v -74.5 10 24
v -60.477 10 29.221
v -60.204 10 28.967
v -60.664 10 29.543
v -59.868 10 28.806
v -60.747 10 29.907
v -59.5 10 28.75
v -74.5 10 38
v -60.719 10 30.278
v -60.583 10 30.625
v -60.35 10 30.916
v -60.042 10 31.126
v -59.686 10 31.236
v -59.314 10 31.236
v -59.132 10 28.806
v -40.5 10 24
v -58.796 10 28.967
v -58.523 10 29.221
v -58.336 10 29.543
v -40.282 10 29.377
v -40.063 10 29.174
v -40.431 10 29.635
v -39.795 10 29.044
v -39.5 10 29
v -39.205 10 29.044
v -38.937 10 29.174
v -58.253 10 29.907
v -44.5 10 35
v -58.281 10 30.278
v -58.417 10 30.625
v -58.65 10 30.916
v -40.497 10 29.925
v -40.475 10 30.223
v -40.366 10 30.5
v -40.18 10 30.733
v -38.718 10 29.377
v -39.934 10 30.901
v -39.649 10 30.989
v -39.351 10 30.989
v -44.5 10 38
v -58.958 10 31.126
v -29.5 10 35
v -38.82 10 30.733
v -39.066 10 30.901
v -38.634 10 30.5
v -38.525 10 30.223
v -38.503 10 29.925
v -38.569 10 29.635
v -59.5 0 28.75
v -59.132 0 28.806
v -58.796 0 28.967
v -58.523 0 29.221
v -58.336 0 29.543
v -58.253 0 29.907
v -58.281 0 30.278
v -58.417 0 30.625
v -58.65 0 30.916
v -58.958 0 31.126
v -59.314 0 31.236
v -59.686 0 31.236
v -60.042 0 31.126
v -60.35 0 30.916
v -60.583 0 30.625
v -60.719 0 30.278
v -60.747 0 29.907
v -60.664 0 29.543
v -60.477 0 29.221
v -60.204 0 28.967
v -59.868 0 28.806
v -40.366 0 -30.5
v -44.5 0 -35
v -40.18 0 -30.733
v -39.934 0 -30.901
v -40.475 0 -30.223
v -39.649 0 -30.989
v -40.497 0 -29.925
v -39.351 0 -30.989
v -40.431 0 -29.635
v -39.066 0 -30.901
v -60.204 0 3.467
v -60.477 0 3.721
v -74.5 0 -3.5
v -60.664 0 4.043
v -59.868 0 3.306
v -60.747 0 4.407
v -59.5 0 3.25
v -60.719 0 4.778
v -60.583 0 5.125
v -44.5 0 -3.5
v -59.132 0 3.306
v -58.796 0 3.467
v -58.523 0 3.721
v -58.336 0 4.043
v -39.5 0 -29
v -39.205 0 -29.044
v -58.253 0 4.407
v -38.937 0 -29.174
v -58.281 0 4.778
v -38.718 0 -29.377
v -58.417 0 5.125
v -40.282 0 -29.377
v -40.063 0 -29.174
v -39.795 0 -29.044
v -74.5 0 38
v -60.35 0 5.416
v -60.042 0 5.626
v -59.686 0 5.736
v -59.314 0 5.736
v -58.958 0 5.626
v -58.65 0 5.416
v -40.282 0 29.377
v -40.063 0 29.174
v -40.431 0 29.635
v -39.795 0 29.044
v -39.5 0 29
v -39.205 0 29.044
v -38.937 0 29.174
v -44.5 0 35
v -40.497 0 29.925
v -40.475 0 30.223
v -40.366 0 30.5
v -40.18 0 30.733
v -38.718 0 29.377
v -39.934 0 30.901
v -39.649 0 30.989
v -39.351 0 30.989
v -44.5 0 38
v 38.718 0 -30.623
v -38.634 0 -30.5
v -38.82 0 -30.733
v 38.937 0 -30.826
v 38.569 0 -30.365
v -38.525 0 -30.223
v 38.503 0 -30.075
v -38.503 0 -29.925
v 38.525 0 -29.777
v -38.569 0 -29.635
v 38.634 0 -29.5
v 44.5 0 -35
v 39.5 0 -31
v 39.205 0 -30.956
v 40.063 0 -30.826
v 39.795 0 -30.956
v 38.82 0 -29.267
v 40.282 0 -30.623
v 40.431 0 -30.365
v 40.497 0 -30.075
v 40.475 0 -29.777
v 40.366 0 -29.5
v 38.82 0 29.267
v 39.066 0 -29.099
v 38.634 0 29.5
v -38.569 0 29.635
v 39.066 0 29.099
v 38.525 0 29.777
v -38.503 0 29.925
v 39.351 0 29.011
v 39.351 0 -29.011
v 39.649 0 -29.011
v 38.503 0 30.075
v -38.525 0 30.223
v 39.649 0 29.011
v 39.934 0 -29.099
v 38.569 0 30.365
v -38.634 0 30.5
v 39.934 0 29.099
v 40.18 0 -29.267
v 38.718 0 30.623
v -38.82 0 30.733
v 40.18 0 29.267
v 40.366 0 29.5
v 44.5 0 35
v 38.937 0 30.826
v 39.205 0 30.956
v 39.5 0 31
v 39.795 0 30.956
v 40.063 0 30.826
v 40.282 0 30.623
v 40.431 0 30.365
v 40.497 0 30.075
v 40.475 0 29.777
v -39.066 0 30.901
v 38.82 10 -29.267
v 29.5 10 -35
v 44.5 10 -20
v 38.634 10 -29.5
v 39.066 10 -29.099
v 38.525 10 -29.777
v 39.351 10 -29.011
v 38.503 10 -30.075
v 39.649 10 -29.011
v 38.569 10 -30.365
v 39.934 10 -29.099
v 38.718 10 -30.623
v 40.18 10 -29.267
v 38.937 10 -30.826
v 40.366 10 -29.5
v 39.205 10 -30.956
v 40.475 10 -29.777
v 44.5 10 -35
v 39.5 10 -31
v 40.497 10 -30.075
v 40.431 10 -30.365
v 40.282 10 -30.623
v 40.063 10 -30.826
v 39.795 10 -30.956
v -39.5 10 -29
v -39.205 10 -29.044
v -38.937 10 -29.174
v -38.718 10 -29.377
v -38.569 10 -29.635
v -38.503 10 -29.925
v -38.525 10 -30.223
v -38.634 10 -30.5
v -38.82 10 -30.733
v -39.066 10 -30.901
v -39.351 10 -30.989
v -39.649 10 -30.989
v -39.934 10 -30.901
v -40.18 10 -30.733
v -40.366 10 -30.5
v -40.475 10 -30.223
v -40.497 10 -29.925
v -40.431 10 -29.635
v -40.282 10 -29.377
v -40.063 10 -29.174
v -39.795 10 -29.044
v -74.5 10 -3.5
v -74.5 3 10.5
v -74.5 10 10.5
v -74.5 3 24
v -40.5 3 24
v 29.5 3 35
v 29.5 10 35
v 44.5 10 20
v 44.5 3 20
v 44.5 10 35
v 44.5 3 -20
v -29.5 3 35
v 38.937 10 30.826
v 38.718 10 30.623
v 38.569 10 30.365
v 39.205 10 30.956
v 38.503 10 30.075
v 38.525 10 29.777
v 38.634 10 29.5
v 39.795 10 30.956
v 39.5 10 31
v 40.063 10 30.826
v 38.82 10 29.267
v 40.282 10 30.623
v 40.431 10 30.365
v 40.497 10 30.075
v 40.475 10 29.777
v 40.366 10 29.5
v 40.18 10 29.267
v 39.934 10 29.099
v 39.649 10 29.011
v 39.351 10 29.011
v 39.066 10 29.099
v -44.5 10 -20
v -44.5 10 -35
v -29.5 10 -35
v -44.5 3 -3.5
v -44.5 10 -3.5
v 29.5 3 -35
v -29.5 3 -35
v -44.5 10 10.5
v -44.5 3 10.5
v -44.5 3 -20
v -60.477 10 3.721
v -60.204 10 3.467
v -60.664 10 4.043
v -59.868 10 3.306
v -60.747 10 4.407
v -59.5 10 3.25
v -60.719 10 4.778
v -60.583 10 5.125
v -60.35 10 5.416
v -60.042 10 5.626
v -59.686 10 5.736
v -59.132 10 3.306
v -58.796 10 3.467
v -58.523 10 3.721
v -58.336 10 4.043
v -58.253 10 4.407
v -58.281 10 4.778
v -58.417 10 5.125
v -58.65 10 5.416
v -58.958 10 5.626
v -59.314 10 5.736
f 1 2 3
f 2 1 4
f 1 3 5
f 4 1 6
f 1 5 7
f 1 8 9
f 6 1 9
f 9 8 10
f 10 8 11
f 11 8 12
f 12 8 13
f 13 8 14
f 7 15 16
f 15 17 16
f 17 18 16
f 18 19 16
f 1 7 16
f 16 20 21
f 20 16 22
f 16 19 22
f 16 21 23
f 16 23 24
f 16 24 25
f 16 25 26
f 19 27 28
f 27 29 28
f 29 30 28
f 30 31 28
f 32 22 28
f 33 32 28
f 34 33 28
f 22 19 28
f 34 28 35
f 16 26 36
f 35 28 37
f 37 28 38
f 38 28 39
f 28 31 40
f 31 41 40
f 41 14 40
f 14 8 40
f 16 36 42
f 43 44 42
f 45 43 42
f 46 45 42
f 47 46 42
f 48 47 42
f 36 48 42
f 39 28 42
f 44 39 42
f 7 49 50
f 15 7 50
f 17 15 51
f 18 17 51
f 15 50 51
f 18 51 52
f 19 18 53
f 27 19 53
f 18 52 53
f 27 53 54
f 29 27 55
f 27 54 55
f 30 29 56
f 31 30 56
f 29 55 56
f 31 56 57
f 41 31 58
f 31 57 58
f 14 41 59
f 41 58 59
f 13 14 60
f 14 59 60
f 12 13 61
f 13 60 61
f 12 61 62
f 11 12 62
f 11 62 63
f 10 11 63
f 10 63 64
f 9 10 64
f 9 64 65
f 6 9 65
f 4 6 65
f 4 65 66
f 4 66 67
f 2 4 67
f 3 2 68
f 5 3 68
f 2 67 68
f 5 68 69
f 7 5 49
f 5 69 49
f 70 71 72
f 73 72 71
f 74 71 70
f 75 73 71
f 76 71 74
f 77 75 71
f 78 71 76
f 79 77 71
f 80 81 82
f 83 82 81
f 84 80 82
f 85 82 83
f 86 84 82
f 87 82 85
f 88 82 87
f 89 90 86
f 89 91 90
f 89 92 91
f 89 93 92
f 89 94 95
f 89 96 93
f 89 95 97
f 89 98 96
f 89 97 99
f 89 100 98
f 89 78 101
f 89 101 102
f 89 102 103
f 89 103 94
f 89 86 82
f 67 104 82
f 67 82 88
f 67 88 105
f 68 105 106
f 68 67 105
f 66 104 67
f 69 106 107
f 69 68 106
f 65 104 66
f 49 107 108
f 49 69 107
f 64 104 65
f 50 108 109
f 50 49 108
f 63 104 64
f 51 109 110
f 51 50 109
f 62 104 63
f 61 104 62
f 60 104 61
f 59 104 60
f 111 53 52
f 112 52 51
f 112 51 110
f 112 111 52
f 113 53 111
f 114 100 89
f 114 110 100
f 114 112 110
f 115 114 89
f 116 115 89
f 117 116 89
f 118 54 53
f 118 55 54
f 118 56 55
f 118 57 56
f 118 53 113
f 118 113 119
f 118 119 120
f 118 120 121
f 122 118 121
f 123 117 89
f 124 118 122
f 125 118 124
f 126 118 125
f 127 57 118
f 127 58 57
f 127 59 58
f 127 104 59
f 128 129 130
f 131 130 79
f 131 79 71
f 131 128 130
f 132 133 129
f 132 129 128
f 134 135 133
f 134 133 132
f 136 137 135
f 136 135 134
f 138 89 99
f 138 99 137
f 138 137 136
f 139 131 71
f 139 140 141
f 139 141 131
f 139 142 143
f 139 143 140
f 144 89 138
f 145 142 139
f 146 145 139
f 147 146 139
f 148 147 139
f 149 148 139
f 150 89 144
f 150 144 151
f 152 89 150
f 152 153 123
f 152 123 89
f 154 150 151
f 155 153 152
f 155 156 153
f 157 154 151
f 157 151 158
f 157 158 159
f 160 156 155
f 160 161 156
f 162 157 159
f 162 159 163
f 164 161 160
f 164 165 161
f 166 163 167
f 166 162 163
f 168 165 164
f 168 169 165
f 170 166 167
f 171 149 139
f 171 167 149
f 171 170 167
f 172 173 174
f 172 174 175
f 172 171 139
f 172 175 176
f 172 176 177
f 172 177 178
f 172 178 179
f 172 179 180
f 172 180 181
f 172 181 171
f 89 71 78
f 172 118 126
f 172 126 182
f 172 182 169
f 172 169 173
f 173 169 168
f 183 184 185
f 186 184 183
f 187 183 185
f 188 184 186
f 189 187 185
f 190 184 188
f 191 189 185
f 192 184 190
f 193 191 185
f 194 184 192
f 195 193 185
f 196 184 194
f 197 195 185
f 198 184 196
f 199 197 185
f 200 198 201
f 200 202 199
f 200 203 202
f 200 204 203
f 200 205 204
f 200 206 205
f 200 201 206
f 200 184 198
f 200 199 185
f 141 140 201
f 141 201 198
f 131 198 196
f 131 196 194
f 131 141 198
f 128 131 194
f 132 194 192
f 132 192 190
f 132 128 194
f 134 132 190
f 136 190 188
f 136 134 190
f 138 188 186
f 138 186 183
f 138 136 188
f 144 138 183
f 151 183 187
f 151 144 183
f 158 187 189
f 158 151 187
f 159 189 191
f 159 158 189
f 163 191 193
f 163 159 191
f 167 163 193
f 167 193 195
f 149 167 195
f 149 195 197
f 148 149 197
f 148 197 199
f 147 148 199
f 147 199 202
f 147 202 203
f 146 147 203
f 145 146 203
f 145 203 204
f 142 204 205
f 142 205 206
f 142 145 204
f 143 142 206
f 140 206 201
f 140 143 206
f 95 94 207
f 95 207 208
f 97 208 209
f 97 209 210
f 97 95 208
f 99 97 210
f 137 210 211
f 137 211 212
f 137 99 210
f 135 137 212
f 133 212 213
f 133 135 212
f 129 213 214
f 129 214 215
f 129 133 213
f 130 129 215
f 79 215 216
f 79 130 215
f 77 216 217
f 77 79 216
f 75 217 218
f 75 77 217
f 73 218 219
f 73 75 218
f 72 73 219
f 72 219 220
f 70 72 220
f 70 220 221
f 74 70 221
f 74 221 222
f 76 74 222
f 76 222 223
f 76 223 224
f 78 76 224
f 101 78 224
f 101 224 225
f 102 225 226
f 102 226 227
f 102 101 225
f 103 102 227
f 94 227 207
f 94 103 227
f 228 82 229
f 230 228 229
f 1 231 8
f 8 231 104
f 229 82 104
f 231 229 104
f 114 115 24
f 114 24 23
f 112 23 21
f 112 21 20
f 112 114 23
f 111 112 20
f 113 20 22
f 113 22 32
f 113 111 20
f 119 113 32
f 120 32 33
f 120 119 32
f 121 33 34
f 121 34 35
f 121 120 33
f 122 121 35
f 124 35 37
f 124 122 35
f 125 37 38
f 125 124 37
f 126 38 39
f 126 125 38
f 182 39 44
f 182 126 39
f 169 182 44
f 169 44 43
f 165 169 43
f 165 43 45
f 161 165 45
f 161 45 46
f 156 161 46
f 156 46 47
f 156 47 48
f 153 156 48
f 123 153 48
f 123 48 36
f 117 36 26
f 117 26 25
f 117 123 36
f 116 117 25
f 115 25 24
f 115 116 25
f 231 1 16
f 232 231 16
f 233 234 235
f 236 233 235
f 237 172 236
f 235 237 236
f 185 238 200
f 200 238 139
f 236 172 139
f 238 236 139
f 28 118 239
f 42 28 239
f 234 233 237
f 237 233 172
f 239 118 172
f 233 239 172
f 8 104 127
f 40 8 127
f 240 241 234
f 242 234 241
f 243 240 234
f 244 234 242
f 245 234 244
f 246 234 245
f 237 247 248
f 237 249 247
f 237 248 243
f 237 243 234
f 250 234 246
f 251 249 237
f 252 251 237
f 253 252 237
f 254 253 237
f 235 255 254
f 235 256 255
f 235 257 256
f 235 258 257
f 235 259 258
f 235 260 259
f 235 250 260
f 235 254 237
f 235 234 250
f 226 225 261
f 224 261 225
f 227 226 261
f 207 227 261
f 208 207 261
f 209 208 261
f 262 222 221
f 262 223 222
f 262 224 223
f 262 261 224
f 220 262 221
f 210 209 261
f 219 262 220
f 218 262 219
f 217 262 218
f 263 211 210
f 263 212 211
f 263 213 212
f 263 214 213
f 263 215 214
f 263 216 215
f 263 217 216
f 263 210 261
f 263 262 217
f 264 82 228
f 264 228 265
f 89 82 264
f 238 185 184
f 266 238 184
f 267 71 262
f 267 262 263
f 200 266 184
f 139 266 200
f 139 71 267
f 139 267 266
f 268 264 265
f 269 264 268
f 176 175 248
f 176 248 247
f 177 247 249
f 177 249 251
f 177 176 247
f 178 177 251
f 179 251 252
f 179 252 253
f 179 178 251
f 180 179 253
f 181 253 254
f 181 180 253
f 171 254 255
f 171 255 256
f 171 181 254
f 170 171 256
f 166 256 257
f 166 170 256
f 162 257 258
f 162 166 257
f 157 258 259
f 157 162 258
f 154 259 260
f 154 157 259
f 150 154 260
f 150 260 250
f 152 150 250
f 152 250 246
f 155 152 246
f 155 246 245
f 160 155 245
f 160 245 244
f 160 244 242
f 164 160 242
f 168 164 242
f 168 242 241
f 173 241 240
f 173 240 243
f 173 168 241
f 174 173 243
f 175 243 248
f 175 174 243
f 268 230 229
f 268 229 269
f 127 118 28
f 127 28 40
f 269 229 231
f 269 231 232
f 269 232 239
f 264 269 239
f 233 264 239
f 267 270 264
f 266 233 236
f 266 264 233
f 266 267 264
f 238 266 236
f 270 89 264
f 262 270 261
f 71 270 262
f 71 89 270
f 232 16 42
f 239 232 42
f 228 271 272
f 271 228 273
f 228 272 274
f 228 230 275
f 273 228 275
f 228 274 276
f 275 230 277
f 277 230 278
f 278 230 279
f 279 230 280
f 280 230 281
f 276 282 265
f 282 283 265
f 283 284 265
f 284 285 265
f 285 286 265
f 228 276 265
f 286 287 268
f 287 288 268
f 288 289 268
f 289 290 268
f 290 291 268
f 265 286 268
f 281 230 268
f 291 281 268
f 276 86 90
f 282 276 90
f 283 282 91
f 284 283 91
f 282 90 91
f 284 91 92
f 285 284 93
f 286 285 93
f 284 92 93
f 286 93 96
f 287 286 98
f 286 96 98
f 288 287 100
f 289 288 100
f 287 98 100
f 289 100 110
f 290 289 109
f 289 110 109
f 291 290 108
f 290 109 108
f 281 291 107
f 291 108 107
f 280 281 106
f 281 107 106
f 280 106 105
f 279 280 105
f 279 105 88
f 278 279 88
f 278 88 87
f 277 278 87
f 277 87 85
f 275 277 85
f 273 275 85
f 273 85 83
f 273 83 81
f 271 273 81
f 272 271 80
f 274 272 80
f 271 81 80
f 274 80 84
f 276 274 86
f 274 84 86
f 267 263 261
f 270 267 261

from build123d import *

# Parameters (mm, degrees)
SKETCH1_W           = 89
SKETCH1_H           = 70
SKETCH1_R           = 1
BOSS_EXTRUDE1_DEPTH = 10
CUT_EXTRUDE2_DEPTH  = 7
SKETCH6_W           = 30
SKETCH6_H           = 41.5
SKETCH6_R           = 1.25
BOSS_EXTRUDE2_DEPTH = 10
SKETCH7_W           = 34
SKETCH7_H           = 13.5
CUT_EXTRUDE3_DEPTH  = 7


with BuildPart() as part:
    # Sketch1 → Boss-Extrude1 (new body)
    with BuildSketch(Plane(origin=(0, 0, 0), x_dir=(1, 0, 0), z_dir=(0, 1, 0))):
        Rectangle(SKETCH1_W, SKETCH1_H)
        with Locations(Location((-39.5, 30, 0), (0, 0, 270))):
            Circle(SKETCH1_R, mode=Mode.SUBTRACT)
        with Locations(Location((39.5, 30, 0), (0, 0, 90))):
            Circle(SKETCH1_R, mode=Mode.SUBTRACT)
        with Locations(Location((39.5, -30, 0), (0, 0, 270))):
            Circle(SKETCH1_R, mode=Mode.SUBTRACT)
        with Locations(Location((-39.5, -30, 0), (0, 0, 90))):
            Circle(SKETCH1_R, mode=Mode.SUBTRACT)
    extrude(amount=BOSS_EXTRUDE1_DEPTH)

    # Sketch3 → Cut-Extrude2 (cut)
    with BuildSketch(Plane(origin=(0, 10, 0), x_dir=(1, 0, 0), z_dir=(0, 1, 0))):
        Polygon((-44.5, -20), (-29.5, -35), (29.5, -35), (44.5, -20), (44.5, 20), (29.5, 35), (-29.5, 35), (-44.5, 20), align=None)
    extrude(amount=-CUT_EXTRUDE2_DEPTH, mode=Mode.SUBTRACT)

    # Sketch6 → Boss-Extrude2 (add)
    with BuildSketch(Plane.XZ):
        with Locations((-59.5, 17.25)):
            Rectangle(SKETCH6_W, SKETCH6_H)
        with Locations(Location((-59.5, 30, 0), (0, 0, 270))):
            Circle(SKETCH6_R, mode=Mode.SUBTRACT)
        with Locations(Location((-59.5, 4.5, 0), (0, 0, 270))):
            Circle(SKETCH6_R, mode=Mode.SUBTRACT)
    extrude(amount=-BOSS_EXTRUDE2_DEPTH)

    # Sketch7 → Cut-Extrude3 (cut)
    with BuildSketch(Plane(origin=(0, 10, 0), x_dir=(1, 0, 0), z_dir=(0, 1, 0))):
        with Locations((-57.5, -17.25)):
            Rectangle(SKETCH7_W, SKETCH7_H)
    extrude(amount=-CUT_EXTRUDE3_DEPTH, mode=Mode.SUBTRACT)


solid = part.part
